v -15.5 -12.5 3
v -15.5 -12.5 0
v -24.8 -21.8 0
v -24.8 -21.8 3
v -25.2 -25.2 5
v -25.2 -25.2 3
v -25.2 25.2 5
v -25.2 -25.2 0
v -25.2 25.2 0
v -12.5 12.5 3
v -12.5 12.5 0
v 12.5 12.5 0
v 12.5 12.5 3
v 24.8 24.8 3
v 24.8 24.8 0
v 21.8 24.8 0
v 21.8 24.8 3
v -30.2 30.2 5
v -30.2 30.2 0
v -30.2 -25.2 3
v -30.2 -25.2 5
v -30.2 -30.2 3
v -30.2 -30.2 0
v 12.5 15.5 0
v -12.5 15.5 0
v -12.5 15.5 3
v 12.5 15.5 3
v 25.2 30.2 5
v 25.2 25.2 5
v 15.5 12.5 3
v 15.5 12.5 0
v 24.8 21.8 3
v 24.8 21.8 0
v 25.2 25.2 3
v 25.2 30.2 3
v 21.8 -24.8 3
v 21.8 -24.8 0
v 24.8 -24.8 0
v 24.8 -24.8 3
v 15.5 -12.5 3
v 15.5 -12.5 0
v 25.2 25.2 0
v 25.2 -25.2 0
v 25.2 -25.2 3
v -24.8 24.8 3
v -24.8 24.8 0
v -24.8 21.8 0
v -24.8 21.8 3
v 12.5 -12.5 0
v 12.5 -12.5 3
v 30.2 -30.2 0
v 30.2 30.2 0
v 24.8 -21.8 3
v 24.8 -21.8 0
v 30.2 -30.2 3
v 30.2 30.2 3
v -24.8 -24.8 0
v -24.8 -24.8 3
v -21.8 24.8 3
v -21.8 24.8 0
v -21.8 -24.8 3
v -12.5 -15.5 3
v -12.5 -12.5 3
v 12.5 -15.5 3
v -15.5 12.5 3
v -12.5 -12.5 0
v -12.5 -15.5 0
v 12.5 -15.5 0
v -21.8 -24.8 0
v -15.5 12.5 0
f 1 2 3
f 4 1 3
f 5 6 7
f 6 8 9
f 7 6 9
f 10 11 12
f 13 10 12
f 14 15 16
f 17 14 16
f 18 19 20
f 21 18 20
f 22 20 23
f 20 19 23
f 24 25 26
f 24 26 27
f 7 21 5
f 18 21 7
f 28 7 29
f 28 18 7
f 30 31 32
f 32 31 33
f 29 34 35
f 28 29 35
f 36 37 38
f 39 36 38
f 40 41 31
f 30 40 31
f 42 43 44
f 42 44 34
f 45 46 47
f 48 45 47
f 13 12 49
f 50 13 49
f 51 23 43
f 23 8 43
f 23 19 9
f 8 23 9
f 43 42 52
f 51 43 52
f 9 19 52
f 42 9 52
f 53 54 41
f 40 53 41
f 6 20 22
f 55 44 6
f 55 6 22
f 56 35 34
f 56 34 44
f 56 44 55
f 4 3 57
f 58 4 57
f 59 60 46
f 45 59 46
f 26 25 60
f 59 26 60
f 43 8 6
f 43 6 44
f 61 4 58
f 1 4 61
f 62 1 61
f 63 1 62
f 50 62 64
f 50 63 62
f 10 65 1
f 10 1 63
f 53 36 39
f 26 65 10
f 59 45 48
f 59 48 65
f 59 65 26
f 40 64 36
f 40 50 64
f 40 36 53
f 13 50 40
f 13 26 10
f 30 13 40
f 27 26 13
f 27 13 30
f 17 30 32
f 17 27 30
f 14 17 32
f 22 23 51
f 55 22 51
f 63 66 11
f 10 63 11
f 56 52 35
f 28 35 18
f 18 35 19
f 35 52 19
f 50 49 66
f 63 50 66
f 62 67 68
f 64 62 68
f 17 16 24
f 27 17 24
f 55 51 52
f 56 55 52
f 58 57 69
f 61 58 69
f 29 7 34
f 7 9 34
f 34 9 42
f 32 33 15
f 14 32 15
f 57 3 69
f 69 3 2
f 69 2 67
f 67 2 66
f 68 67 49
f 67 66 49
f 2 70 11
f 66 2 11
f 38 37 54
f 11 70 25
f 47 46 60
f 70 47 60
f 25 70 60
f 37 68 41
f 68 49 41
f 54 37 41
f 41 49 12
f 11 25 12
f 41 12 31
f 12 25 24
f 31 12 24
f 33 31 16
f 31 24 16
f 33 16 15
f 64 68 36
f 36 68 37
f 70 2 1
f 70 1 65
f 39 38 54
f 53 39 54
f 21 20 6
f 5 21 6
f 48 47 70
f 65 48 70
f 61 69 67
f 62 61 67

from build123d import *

# Parameters (mm, degrees)
SKETCH1_W             = 60.4
SKETCH1_H             = 60.4
SKETCH1_W_2           = 50.4
SKETCH1_H_2           = 50.4
EXTRUDE_THIN1_DEPTH   = 3
BOSS_EXTRUDE1_DEPTH   = 3
BOSS_EXTRUDE1_2_DEPTH = 3
BOSS_EXTRUDE1_3_DEPTH = 3
BOSS_EXTRUDE1_4_DEPTH = 3
SKETCH1_5_W           = 31
SKETCH1_5_H           = 31
SKETCH1_5_W_2         = 25
SKETCH1_5_H_2         = 25
EXTRUDE_THIN2_DEPTH   = 3
EXTRUDE_THIN3_DEPTH   = 2


with BuildPart() as part:
    # Sketch1 → Extrude-Thin1 (new body)
    with BuildSketch(Plane.XY):
        Rectangle(SKETCH1_W, SKETCH1_H)
        Rectangle(SKETCH1_W_2, SKETCH1_H_2, mode=Mode.SUBTRACT)
    extrude(amount=EXTRUDE_THIN1_DEPTH)

    # Sketch2 → Extrude-Thin3 (add)
    with BuildSketch(Plane.XY.offset(3)):
        Polygon((-25.2, -25.2), (-25.2, 25.2), (25.2, 25.2), (25.2, 30.2), (-30.2, 30.2), (-30.2, -25.2), align=None)
    extrude(amount=EXTRUDE_THIN3_DEPTH)


with BuildPart() as body_2:
    # Sketch1<4> → Boss-Extrude1 (new body)
    with BuildSketch(Plane.XY):
        Polygon((24.8, -24.8), (24.8, -21.8), (12.5, -9.5), (12.5, -12.5), (9.5, -12.5), (21.8, -24.8), align=None)
    extrude(amount=BOSS_EXTRUDE1_DEPTH)



with BuildPart() as body_3:
    # Sketch1<4> → Boss-Extrude1 2 (new body)
    with BuildSketch(Plane.XY):
        Polygon((-12.5, -9.5), (-24.8, -21.8), (-24.8, -24.8), (-21.8, -24.8), (-9.5, -12.5), (-12.5, -12.5), align=None)
    extrude(amount=BOSS_EXTRUDE1_2_DEPTH)


with BuildPart() as body_4:
    # Sketch1<4> → Boss-Extrude1 3 (new body)
    with BuildSketch(Plane.XY):
        Polygon((-21.8, 24.8), (-24.8, 24.8), (-24.8, 21.8), (-12.5, 9.5), (-12.5, 12.5), (-9.5, 12.5), align=None)
    extrude(amount=BOSS_EXTRUDE1_3_DEPTH)


with BuildPart() as body_5:
    # Sketch1<4> → Boss-Extrude1 4 (new body)
    with BuildSketch(Plane.XY):
        Polygon((24.8, 24.8), (21.8, 24.8), (9.5, 12.5), (12.5, 12.5), (12.5, 9.5), (24.8, 21.8), align=None)
    extrude(amount=BOSS_EXTRUDE1_4_DEPTH)


with BuildPart() as body_2_1:
    add(body_2.part)

    add(body_3.part)  # Extrude-Thin2 merges body 3

    add(body_4.part)  # Extrude-Thin2 merges body 4

    add(body_5.part)  # Extrude-Thin2 merges body 5
    # Sketch1<5> → Extrude-Thin2 (add)
    with BuildSketch(Plane.XY):
        Rectangle(SKETCH1_5_W, SKETCH1_5_H)
        Rectangle(SKETCH1_5_W_2, SKETCH1_5_H_2, mode=Mode.SUBTRACT)
    extrude(amount=EXTRUDE_THIN2_DEPTH)


solid = Compound([part.part, body_2_1.part])
